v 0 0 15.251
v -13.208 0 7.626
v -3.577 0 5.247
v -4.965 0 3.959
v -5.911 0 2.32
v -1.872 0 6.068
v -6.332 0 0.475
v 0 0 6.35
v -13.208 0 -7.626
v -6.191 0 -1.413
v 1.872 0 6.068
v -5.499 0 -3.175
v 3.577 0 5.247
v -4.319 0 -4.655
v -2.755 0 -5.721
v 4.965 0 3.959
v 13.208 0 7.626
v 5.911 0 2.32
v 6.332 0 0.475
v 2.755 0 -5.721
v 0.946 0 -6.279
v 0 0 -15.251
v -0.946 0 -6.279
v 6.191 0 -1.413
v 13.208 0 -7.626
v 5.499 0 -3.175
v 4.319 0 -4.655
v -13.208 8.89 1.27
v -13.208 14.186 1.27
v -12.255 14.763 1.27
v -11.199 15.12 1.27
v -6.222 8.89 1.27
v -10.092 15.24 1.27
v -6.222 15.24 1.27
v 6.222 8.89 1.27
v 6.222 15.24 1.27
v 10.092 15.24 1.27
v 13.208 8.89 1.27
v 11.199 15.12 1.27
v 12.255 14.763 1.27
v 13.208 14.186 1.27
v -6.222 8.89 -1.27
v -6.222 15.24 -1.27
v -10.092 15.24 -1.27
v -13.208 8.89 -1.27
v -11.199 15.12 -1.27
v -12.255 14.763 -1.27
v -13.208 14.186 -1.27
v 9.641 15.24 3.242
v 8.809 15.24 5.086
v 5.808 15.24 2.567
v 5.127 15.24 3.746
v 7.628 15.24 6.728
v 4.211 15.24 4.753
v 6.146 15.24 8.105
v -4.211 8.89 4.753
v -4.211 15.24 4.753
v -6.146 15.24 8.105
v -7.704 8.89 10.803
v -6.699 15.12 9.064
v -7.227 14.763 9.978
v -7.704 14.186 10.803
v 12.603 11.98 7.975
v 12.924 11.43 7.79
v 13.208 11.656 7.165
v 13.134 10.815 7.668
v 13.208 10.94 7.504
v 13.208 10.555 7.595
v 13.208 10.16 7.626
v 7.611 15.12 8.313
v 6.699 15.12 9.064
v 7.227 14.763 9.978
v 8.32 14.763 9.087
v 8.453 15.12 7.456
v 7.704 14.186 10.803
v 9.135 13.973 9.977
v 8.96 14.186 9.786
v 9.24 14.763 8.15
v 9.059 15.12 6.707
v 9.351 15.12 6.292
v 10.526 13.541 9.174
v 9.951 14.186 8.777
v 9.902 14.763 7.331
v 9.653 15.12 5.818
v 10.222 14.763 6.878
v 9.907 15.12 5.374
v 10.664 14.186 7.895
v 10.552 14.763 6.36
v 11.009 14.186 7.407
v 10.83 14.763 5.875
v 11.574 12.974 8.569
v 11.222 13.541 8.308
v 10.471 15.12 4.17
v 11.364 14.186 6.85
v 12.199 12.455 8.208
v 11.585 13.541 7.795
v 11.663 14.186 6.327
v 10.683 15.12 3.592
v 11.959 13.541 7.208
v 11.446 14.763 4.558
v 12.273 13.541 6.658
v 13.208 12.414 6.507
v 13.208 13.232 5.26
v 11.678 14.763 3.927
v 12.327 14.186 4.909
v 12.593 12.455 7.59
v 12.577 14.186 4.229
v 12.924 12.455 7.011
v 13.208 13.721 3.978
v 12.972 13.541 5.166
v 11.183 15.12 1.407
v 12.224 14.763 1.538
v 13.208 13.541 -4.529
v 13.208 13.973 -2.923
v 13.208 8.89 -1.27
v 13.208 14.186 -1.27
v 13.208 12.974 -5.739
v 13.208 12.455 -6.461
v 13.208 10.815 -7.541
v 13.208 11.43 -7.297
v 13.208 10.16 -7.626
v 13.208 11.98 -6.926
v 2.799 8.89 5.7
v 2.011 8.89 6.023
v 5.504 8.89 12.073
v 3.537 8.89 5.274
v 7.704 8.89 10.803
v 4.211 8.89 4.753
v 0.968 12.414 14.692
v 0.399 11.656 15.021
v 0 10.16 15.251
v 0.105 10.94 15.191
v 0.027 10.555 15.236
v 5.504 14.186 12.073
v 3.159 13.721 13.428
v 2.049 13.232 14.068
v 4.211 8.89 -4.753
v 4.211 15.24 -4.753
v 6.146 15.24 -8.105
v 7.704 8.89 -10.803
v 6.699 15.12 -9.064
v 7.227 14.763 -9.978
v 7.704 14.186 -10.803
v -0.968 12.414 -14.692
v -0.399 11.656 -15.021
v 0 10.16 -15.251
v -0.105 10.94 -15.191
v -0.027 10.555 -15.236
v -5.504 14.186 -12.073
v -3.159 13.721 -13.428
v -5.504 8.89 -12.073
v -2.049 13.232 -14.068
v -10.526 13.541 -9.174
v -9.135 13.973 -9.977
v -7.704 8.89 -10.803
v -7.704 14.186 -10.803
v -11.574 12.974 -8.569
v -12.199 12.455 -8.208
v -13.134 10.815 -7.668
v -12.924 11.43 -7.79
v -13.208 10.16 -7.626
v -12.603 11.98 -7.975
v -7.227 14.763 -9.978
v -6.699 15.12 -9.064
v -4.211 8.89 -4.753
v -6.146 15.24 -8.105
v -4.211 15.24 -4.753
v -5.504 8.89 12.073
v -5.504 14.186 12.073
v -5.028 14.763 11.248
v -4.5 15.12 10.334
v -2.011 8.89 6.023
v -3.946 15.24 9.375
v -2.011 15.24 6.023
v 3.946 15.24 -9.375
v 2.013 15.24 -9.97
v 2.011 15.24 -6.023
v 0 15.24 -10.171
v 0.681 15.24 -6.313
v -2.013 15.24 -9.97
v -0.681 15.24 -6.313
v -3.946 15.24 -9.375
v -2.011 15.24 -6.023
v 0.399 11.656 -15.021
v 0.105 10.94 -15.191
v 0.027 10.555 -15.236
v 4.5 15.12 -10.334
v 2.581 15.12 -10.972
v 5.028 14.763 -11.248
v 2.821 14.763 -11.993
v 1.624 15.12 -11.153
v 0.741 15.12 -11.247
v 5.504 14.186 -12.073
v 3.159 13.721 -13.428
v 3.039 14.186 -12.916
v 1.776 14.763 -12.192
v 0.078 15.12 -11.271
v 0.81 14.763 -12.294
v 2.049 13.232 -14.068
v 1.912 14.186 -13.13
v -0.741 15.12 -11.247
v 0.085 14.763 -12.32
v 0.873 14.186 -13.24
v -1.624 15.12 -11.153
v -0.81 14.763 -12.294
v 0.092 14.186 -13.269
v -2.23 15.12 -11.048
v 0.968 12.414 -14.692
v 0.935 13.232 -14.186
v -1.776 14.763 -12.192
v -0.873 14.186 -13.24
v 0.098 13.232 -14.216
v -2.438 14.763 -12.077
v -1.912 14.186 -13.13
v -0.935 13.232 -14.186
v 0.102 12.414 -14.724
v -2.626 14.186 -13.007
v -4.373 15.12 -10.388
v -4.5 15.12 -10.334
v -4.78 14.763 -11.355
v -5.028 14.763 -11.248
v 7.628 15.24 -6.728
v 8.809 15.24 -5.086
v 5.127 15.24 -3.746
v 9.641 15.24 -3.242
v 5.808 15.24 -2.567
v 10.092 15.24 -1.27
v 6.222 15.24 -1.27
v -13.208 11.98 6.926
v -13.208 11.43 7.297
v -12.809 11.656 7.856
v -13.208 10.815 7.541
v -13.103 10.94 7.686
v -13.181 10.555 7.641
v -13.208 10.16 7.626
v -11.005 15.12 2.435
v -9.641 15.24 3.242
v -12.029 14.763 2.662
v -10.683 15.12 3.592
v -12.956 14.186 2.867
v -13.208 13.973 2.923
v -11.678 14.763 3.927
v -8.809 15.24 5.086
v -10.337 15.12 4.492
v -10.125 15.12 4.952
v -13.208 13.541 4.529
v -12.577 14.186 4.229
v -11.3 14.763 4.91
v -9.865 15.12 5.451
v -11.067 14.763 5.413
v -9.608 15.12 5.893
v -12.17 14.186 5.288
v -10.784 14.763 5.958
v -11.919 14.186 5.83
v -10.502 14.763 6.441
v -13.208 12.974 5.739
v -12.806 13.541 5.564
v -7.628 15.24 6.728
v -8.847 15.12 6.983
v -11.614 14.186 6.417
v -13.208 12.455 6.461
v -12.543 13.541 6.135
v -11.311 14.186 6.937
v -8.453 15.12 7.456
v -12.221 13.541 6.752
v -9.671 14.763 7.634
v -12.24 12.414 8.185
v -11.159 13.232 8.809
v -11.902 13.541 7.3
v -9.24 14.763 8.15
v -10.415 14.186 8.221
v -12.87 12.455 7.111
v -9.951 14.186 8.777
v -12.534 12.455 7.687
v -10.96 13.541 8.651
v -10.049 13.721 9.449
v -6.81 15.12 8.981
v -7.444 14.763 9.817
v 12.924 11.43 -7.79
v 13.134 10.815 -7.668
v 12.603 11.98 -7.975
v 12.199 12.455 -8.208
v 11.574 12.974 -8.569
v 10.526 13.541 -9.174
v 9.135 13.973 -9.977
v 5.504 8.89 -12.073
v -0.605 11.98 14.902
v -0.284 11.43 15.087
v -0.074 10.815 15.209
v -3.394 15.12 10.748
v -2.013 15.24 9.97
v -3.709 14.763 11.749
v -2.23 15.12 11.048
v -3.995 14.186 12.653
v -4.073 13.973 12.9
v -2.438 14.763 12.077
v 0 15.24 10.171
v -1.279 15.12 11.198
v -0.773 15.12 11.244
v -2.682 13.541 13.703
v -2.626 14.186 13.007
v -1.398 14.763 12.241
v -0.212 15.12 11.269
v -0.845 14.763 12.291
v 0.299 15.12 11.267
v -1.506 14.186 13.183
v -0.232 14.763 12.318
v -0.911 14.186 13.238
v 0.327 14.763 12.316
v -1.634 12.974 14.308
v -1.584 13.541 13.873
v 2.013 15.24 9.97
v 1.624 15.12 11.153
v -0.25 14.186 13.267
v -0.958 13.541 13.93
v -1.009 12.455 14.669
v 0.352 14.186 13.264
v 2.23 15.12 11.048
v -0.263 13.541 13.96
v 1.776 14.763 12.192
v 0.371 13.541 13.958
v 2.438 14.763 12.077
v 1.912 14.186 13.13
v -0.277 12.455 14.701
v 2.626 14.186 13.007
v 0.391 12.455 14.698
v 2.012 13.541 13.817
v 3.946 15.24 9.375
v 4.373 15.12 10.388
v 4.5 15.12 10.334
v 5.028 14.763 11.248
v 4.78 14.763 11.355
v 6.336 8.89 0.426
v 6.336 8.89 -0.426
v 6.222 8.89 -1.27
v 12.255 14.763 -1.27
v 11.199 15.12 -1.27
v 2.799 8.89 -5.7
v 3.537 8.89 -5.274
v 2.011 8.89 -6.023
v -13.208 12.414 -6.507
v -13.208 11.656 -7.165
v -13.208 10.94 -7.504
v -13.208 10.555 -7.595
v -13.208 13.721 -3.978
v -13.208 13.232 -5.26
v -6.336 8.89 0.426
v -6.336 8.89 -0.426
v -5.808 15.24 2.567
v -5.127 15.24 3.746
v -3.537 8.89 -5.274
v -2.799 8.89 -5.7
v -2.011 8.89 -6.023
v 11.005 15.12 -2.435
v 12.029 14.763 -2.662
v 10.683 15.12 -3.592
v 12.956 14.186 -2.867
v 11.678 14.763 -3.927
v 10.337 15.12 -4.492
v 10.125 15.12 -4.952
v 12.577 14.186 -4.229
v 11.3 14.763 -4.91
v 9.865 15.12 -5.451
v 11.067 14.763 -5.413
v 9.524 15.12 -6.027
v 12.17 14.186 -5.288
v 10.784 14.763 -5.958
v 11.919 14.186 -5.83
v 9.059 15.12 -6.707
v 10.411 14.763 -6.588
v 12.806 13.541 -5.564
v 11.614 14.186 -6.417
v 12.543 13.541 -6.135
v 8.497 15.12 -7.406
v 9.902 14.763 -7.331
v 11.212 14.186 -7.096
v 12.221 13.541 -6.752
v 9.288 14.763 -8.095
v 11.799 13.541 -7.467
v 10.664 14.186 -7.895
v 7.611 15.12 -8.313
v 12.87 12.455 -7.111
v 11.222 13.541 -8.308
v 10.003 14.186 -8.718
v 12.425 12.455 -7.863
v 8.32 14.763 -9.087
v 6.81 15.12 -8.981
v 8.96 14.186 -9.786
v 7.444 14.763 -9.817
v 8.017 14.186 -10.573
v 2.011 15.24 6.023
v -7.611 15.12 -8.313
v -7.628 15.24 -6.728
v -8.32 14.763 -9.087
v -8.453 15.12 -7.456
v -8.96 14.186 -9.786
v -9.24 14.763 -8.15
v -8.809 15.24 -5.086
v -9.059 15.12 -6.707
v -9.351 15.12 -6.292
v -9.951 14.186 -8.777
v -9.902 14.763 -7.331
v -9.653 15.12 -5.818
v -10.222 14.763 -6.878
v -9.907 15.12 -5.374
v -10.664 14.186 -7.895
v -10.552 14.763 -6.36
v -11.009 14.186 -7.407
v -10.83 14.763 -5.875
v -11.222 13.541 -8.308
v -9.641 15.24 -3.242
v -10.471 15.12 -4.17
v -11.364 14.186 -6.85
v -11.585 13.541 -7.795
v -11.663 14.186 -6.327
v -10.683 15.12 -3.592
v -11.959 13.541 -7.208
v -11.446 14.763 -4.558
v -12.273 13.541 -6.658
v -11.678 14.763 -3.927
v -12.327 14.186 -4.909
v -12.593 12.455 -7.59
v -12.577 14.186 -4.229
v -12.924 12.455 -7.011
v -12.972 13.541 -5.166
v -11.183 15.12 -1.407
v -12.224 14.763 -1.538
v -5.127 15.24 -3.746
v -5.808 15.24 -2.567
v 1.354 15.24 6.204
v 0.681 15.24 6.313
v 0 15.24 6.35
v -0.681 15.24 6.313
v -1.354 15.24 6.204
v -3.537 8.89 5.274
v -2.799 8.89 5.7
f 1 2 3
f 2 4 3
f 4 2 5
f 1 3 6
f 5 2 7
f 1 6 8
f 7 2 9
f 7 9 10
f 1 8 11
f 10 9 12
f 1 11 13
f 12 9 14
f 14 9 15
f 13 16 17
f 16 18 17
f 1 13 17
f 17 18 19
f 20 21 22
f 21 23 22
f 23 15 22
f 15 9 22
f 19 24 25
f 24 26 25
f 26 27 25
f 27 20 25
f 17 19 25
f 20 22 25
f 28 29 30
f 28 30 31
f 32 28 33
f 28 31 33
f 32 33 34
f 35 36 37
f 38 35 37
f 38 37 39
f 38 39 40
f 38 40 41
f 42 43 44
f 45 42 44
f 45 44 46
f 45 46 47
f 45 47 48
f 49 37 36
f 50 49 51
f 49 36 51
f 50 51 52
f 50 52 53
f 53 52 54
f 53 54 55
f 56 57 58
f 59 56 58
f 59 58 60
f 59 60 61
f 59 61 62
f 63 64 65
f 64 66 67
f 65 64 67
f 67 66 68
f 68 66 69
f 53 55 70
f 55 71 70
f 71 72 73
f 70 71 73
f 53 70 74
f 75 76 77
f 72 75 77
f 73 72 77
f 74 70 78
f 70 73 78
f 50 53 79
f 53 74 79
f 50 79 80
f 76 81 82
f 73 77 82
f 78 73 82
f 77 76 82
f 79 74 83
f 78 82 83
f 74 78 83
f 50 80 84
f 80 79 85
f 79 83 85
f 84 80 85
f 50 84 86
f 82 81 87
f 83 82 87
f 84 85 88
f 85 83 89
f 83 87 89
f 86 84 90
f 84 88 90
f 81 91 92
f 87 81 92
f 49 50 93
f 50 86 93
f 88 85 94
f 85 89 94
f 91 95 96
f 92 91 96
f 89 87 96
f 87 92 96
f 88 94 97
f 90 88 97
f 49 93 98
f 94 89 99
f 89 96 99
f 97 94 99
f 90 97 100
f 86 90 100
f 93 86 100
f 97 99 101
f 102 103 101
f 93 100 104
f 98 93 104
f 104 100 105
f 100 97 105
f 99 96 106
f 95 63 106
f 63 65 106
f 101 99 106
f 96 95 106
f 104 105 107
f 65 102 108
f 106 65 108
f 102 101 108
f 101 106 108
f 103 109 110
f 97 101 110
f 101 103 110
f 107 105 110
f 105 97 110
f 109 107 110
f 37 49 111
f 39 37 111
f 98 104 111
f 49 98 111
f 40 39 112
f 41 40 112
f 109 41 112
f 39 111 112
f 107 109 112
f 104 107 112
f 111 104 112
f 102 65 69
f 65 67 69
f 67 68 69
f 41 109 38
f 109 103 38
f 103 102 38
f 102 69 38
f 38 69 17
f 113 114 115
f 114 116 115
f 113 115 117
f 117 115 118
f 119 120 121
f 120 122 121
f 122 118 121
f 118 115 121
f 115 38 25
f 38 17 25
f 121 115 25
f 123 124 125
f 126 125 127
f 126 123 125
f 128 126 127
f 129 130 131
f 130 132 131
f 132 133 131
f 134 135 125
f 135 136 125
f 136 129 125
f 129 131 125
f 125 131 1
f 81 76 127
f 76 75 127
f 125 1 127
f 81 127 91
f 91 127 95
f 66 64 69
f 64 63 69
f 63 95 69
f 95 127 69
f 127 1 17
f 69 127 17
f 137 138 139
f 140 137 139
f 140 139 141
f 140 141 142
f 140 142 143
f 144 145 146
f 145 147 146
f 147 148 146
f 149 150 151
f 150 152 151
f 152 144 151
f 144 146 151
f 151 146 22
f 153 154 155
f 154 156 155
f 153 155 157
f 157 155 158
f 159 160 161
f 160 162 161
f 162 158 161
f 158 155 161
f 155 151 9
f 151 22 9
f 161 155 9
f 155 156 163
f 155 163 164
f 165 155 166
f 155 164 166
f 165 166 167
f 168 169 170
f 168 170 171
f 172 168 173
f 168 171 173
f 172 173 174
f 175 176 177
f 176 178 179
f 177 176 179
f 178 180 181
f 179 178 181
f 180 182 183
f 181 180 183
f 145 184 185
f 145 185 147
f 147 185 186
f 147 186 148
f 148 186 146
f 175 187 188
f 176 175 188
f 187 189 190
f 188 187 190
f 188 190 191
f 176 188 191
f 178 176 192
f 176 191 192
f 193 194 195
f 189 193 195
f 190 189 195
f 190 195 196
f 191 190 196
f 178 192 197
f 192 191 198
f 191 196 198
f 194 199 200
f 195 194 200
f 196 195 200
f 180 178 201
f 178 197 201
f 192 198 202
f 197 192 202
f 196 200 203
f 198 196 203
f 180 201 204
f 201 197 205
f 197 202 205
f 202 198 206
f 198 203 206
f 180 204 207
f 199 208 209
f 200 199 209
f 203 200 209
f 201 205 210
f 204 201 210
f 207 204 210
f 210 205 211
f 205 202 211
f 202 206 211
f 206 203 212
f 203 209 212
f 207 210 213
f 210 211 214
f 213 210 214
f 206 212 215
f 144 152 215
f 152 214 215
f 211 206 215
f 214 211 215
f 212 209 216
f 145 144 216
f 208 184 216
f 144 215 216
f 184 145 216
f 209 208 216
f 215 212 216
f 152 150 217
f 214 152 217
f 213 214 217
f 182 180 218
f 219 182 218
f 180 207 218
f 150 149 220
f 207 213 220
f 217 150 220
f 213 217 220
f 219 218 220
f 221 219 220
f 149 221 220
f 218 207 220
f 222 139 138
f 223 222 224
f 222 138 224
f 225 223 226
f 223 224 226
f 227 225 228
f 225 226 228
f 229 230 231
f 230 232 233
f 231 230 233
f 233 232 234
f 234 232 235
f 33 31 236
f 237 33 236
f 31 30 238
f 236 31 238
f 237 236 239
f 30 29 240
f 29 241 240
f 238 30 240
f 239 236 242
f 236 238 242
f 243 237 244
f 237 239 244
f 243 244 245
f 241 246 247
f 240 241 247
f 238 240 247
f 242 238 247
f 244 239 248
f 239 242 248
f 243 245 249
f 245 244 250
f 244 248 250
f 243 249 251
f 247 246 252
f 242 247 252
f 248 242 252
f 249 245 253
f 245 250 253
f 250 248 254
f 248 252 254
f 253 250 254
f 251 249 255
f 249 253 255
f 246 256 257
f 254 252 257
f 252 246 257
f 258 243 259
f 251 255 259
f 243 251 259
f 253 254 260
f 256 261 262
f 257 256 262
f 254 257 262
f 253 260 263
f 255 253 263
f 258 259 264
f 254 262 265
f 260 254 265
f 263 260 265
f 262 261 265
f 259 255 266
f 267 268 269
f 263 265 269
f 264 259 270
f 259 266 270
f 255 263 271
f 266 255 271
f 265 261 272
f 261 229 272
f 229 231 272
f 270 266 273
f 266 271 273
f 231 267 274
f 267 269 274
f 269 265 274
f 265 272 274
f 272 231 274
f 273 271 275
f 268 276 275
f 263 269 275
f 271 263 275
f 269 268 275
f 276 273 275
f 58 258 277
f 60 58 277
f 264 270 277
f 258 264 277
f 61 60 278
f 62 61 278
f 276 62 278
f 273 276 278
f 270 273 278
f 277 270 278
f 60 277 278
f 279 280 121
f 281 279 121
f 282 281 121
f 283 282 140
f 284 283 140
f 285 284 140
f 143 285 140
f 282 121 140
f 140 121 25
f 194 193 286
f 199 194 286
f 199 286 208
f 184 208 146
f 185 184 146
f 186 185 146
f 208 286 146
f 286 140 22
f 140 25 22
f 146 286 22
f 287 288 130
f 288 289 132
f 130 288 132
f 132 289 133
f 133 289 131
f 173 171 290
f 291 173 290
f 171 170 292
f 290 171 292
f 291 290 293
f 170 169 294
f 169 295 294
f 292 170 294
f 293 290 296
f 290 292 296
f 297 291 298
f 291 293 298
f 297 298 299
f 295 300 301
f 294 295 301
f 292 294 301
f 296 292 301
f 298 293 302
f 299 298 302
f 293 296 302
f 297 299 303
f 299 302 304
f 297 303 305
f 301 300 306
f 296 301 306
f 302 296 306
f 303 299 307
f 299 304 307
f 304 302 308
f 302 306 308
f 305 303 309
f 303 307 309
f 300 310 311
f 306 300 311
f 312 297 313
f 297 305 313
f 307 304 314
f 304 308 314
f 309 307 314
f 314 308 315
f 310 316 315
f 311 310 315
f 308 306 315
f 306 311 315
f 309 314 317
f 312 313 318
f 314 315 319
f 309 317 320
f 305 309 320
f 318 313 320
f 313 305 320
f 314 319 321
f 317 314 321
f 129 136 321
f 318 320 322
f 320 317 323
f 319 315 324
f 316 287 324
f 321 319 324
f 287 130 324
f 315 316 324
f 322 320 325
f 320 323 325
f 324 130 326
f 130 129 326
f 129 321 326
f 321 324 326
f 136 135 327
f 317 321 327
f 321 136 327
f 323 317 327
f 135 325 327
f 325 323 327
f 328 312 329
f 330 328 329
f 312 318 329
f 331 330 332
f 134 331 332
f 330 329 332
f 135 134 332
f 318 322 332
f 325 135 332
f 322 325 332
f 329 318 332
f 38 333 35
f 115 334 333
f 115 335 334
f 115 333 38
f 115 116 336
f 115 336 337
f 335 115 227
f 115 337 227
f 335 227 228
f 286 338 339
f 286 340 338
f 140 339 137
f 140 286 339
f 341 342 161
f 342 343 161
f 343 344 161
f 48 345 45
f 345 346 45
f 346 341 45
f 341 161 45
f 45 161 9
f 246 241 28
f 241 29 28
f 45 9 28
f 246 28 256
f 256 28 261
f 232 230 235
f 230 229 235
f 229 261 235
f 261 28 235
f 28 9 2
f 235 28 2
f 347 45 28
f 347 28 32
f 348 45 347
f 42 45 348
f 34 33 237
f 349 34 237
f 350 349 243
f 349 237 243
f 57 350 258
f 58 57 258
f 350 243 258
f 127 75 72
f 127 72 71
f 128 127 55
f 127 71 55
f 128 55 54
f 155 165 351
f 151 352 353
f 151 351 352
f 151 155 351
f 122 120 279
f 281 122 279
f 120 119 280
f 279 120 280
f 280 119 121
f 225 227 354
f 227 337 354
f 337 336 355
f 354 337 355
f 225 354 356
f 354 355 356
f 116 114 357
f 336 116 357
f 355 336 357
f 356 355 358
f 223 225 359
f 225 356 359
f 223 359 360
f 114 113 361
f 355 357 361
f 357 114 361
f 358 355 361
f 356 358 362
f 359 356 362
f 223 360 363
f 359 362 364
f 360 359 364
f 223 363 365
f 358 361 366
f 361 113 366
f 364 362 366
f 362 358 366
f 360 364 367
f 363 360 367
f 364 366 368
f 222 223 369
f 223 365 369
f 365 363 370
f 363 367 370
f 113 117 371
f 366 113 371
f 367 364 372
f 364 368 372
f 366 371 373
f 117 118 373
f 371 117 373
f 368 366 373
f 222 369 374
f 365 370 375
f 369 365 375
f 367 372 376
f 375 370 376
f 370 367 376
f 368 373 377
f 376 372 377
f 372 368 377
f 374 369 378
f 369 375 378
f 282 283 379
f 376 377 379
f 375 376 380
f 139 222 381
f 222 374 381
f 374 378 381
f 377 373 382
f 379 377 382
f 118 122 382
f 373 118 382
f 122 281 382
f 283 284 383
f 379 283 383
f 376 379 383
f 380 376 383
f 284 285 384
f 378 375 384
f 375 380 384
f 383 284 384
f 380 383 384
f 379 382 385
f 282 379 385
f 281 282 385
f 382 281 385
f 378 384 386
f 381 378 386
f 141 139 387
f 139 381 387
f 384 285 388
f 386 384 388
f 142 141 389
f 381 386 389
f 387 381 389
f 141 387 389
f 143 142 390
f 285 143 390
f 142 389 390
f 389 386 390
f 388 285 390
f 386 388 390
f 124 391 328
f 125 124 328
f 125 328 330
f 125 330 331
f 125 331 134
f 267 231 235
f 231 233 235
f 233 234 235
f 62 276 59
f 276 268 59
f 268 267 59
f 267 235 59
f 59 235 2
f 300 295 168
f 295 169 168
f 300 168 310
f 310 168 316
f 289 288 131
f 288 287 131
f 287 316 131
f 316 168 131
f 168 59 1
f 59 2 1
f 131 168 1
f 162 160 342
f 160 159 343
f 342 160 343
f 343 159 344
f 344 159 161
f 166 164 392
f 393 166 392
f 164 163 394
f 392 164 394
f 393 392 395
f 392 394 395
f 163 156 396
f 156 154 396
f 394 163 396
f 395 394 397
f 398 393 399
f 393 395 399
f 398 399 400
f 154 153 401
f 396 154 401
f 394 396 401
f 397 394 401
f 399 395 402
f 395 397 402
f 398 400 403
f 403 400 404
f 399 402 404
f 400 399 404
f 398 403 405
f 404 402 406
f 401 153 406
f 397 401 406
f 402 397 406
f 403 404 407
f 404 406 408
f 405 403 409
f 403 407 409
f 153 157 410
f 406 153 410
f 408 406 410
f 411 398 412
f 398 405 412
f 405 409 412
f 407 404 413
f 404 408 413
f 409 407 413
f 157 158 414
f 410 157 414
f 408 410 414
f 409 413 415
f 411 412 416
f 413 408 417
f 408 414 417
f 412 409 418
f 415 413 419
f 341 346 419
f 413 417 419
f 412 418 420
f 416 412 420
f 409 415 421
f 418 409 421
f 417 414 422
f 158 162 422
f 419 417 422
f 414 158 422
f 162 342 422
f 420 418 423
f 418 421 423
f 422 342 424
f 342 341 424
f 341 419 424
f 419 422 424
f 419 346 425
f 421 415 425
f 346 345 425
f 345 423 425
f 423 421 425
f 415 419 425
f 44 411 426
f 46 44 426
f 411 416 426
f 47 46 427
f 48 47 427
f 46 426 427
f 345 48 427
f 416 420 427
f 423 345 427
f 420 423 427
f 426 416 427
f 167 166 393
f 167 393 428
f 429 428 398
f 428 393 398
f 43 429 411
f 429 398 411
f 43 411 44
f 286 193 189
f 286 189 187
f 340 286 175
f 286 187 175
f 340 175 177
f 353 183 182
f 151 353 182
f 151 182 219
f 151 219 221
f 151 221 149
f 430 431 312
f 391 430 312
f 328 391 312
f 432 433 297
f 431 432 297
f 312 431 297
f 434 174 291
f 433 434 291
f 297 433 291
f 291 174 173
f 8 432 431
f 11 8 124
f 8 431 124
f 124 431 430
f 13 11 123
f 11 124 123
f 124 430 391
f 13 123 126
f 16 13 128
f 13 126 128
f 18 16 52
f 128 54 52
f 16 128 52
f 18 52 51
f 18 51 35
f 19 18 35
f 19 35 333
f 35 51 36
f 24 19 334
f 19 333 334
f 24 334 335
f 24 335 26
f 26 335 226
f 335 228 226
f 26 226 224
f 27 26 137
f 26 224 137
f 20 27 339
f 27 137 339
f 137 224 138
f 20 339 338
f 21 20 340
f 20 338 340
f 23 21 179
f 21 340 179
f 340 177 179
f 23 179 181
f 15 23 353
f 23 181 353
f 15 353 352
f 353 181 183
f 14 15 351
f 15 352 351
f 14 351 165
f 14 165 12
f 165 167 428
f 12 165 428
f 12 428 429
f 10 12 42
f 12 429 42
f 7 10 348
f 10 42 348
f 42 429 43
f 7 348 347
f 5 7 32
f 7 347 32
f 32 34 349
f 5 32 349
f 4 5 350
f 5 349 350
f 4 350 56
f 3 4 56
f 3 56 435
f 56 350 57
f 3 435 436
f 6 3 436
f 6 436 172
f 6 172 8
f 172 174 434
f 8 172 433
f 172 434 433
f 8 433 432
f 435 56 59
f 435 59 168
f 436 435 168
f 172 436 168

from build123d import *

# Parameters (mm, degrees)
BOSS_EXTRUDE1_DEPTH = 15.24
CUT_EXTRUDE2_DEPTH  = 6.35
SKETCH8_R           = 6.35
CUT_EXTRUDE4_DEPTH  = 26.284591317


with BuildPart() as part:
    # Sketch1 → Boss-Extrude1 (new body)
    with BuildSketch(Plane(origin=(0, 0, 0), x_dir=(1, 0, 0), z_dir=(0, 1, 0))):
        Polygon((0, 15.251284711), (-13.208, 7.625642355), (-13.208, -7.625642355), (0, -15.251284711), (13.208, -7.625642355), (13.208, 7.625642355), align=None)
    extrude(amount=BOSS_EXTRUDE1_DEPTH)

    # Sketch2 → Cut-Revolve2 (revolve, cut)
    with BuildSketch(Plane(origin=(0, 0, 0), x_dir=(0, 0, -1), z_dir=(1, 0, 0))):
        with BuildLine():
            Line((15.251284711, 10.16), (15.251284711, 0))
            Line((15.251284711, 0), (20.607145121, 0))
            Line((20.607145121, 0), (20.607145121, 19.004731249))
            Line((20.607145121, 19.004731249), (7.625642355, 19.004731249))
            Line((7.625642355, 19.004731249), (7.625642355, 15.24))
            Line((7.625642355, 15.24), (10.171284711, 15.24))
            ThreePointArc((10.171284711, 15.24), (13.763387159, 13.752102448), (15.251284711, 10.16))
        make_face()
    revolve(axis=Axis((0, 0, 0), (0, 1, 0)), mode=Mode.SUBTRACT)

    # Sketch4 → Cut-Extrude2 (cut)
    with BuildSketch(Plane(origin=(0, 15.24, 0), x_dir=(1, 0, 0), z_dir=(0, 1, 0))):
        Polygon((-7.703852263, 10.803463533), (-2.199704526, 1.27), (-13.208, 1.27), (-13.208, -1.27), (-2.199704526, -1.27), (-7.703852263, -10.803463533), (-5.504147737, -12.073463533), (0, -2.54), (5.504147737, -12.073463533), (7.703852263, -10.803463533), (2.199704526, -1.27), (13.208, -1.27), (13.208, 1.27), (2.199704526, 1.27), (7.703852263, 10.803463533), (5.504147737, 12.073463533), (0, 2.54), (-5.504147737, 12.073463533), align=None)
    extrude(amount=-CUT_EXTRUDE2_DEPTH, mode=Mode.SUBTRACT)

    # Sketch8 → Cut-Extrude4 (cut, through all)
    with BuildSketch(Plane(origin=(0, 15.24, 0), x_dir=(1, 0, 0), z_dir=(0, 1, 0))):
        with Locations(Location((0, 0, 0), (0, 0, 270))):
            Circle(SKETCH8_R)
    extrude(amount=-CUT_EXTRUDE4_DEPTH, mode=Mode.SUBTRACT)


solid = part.part
